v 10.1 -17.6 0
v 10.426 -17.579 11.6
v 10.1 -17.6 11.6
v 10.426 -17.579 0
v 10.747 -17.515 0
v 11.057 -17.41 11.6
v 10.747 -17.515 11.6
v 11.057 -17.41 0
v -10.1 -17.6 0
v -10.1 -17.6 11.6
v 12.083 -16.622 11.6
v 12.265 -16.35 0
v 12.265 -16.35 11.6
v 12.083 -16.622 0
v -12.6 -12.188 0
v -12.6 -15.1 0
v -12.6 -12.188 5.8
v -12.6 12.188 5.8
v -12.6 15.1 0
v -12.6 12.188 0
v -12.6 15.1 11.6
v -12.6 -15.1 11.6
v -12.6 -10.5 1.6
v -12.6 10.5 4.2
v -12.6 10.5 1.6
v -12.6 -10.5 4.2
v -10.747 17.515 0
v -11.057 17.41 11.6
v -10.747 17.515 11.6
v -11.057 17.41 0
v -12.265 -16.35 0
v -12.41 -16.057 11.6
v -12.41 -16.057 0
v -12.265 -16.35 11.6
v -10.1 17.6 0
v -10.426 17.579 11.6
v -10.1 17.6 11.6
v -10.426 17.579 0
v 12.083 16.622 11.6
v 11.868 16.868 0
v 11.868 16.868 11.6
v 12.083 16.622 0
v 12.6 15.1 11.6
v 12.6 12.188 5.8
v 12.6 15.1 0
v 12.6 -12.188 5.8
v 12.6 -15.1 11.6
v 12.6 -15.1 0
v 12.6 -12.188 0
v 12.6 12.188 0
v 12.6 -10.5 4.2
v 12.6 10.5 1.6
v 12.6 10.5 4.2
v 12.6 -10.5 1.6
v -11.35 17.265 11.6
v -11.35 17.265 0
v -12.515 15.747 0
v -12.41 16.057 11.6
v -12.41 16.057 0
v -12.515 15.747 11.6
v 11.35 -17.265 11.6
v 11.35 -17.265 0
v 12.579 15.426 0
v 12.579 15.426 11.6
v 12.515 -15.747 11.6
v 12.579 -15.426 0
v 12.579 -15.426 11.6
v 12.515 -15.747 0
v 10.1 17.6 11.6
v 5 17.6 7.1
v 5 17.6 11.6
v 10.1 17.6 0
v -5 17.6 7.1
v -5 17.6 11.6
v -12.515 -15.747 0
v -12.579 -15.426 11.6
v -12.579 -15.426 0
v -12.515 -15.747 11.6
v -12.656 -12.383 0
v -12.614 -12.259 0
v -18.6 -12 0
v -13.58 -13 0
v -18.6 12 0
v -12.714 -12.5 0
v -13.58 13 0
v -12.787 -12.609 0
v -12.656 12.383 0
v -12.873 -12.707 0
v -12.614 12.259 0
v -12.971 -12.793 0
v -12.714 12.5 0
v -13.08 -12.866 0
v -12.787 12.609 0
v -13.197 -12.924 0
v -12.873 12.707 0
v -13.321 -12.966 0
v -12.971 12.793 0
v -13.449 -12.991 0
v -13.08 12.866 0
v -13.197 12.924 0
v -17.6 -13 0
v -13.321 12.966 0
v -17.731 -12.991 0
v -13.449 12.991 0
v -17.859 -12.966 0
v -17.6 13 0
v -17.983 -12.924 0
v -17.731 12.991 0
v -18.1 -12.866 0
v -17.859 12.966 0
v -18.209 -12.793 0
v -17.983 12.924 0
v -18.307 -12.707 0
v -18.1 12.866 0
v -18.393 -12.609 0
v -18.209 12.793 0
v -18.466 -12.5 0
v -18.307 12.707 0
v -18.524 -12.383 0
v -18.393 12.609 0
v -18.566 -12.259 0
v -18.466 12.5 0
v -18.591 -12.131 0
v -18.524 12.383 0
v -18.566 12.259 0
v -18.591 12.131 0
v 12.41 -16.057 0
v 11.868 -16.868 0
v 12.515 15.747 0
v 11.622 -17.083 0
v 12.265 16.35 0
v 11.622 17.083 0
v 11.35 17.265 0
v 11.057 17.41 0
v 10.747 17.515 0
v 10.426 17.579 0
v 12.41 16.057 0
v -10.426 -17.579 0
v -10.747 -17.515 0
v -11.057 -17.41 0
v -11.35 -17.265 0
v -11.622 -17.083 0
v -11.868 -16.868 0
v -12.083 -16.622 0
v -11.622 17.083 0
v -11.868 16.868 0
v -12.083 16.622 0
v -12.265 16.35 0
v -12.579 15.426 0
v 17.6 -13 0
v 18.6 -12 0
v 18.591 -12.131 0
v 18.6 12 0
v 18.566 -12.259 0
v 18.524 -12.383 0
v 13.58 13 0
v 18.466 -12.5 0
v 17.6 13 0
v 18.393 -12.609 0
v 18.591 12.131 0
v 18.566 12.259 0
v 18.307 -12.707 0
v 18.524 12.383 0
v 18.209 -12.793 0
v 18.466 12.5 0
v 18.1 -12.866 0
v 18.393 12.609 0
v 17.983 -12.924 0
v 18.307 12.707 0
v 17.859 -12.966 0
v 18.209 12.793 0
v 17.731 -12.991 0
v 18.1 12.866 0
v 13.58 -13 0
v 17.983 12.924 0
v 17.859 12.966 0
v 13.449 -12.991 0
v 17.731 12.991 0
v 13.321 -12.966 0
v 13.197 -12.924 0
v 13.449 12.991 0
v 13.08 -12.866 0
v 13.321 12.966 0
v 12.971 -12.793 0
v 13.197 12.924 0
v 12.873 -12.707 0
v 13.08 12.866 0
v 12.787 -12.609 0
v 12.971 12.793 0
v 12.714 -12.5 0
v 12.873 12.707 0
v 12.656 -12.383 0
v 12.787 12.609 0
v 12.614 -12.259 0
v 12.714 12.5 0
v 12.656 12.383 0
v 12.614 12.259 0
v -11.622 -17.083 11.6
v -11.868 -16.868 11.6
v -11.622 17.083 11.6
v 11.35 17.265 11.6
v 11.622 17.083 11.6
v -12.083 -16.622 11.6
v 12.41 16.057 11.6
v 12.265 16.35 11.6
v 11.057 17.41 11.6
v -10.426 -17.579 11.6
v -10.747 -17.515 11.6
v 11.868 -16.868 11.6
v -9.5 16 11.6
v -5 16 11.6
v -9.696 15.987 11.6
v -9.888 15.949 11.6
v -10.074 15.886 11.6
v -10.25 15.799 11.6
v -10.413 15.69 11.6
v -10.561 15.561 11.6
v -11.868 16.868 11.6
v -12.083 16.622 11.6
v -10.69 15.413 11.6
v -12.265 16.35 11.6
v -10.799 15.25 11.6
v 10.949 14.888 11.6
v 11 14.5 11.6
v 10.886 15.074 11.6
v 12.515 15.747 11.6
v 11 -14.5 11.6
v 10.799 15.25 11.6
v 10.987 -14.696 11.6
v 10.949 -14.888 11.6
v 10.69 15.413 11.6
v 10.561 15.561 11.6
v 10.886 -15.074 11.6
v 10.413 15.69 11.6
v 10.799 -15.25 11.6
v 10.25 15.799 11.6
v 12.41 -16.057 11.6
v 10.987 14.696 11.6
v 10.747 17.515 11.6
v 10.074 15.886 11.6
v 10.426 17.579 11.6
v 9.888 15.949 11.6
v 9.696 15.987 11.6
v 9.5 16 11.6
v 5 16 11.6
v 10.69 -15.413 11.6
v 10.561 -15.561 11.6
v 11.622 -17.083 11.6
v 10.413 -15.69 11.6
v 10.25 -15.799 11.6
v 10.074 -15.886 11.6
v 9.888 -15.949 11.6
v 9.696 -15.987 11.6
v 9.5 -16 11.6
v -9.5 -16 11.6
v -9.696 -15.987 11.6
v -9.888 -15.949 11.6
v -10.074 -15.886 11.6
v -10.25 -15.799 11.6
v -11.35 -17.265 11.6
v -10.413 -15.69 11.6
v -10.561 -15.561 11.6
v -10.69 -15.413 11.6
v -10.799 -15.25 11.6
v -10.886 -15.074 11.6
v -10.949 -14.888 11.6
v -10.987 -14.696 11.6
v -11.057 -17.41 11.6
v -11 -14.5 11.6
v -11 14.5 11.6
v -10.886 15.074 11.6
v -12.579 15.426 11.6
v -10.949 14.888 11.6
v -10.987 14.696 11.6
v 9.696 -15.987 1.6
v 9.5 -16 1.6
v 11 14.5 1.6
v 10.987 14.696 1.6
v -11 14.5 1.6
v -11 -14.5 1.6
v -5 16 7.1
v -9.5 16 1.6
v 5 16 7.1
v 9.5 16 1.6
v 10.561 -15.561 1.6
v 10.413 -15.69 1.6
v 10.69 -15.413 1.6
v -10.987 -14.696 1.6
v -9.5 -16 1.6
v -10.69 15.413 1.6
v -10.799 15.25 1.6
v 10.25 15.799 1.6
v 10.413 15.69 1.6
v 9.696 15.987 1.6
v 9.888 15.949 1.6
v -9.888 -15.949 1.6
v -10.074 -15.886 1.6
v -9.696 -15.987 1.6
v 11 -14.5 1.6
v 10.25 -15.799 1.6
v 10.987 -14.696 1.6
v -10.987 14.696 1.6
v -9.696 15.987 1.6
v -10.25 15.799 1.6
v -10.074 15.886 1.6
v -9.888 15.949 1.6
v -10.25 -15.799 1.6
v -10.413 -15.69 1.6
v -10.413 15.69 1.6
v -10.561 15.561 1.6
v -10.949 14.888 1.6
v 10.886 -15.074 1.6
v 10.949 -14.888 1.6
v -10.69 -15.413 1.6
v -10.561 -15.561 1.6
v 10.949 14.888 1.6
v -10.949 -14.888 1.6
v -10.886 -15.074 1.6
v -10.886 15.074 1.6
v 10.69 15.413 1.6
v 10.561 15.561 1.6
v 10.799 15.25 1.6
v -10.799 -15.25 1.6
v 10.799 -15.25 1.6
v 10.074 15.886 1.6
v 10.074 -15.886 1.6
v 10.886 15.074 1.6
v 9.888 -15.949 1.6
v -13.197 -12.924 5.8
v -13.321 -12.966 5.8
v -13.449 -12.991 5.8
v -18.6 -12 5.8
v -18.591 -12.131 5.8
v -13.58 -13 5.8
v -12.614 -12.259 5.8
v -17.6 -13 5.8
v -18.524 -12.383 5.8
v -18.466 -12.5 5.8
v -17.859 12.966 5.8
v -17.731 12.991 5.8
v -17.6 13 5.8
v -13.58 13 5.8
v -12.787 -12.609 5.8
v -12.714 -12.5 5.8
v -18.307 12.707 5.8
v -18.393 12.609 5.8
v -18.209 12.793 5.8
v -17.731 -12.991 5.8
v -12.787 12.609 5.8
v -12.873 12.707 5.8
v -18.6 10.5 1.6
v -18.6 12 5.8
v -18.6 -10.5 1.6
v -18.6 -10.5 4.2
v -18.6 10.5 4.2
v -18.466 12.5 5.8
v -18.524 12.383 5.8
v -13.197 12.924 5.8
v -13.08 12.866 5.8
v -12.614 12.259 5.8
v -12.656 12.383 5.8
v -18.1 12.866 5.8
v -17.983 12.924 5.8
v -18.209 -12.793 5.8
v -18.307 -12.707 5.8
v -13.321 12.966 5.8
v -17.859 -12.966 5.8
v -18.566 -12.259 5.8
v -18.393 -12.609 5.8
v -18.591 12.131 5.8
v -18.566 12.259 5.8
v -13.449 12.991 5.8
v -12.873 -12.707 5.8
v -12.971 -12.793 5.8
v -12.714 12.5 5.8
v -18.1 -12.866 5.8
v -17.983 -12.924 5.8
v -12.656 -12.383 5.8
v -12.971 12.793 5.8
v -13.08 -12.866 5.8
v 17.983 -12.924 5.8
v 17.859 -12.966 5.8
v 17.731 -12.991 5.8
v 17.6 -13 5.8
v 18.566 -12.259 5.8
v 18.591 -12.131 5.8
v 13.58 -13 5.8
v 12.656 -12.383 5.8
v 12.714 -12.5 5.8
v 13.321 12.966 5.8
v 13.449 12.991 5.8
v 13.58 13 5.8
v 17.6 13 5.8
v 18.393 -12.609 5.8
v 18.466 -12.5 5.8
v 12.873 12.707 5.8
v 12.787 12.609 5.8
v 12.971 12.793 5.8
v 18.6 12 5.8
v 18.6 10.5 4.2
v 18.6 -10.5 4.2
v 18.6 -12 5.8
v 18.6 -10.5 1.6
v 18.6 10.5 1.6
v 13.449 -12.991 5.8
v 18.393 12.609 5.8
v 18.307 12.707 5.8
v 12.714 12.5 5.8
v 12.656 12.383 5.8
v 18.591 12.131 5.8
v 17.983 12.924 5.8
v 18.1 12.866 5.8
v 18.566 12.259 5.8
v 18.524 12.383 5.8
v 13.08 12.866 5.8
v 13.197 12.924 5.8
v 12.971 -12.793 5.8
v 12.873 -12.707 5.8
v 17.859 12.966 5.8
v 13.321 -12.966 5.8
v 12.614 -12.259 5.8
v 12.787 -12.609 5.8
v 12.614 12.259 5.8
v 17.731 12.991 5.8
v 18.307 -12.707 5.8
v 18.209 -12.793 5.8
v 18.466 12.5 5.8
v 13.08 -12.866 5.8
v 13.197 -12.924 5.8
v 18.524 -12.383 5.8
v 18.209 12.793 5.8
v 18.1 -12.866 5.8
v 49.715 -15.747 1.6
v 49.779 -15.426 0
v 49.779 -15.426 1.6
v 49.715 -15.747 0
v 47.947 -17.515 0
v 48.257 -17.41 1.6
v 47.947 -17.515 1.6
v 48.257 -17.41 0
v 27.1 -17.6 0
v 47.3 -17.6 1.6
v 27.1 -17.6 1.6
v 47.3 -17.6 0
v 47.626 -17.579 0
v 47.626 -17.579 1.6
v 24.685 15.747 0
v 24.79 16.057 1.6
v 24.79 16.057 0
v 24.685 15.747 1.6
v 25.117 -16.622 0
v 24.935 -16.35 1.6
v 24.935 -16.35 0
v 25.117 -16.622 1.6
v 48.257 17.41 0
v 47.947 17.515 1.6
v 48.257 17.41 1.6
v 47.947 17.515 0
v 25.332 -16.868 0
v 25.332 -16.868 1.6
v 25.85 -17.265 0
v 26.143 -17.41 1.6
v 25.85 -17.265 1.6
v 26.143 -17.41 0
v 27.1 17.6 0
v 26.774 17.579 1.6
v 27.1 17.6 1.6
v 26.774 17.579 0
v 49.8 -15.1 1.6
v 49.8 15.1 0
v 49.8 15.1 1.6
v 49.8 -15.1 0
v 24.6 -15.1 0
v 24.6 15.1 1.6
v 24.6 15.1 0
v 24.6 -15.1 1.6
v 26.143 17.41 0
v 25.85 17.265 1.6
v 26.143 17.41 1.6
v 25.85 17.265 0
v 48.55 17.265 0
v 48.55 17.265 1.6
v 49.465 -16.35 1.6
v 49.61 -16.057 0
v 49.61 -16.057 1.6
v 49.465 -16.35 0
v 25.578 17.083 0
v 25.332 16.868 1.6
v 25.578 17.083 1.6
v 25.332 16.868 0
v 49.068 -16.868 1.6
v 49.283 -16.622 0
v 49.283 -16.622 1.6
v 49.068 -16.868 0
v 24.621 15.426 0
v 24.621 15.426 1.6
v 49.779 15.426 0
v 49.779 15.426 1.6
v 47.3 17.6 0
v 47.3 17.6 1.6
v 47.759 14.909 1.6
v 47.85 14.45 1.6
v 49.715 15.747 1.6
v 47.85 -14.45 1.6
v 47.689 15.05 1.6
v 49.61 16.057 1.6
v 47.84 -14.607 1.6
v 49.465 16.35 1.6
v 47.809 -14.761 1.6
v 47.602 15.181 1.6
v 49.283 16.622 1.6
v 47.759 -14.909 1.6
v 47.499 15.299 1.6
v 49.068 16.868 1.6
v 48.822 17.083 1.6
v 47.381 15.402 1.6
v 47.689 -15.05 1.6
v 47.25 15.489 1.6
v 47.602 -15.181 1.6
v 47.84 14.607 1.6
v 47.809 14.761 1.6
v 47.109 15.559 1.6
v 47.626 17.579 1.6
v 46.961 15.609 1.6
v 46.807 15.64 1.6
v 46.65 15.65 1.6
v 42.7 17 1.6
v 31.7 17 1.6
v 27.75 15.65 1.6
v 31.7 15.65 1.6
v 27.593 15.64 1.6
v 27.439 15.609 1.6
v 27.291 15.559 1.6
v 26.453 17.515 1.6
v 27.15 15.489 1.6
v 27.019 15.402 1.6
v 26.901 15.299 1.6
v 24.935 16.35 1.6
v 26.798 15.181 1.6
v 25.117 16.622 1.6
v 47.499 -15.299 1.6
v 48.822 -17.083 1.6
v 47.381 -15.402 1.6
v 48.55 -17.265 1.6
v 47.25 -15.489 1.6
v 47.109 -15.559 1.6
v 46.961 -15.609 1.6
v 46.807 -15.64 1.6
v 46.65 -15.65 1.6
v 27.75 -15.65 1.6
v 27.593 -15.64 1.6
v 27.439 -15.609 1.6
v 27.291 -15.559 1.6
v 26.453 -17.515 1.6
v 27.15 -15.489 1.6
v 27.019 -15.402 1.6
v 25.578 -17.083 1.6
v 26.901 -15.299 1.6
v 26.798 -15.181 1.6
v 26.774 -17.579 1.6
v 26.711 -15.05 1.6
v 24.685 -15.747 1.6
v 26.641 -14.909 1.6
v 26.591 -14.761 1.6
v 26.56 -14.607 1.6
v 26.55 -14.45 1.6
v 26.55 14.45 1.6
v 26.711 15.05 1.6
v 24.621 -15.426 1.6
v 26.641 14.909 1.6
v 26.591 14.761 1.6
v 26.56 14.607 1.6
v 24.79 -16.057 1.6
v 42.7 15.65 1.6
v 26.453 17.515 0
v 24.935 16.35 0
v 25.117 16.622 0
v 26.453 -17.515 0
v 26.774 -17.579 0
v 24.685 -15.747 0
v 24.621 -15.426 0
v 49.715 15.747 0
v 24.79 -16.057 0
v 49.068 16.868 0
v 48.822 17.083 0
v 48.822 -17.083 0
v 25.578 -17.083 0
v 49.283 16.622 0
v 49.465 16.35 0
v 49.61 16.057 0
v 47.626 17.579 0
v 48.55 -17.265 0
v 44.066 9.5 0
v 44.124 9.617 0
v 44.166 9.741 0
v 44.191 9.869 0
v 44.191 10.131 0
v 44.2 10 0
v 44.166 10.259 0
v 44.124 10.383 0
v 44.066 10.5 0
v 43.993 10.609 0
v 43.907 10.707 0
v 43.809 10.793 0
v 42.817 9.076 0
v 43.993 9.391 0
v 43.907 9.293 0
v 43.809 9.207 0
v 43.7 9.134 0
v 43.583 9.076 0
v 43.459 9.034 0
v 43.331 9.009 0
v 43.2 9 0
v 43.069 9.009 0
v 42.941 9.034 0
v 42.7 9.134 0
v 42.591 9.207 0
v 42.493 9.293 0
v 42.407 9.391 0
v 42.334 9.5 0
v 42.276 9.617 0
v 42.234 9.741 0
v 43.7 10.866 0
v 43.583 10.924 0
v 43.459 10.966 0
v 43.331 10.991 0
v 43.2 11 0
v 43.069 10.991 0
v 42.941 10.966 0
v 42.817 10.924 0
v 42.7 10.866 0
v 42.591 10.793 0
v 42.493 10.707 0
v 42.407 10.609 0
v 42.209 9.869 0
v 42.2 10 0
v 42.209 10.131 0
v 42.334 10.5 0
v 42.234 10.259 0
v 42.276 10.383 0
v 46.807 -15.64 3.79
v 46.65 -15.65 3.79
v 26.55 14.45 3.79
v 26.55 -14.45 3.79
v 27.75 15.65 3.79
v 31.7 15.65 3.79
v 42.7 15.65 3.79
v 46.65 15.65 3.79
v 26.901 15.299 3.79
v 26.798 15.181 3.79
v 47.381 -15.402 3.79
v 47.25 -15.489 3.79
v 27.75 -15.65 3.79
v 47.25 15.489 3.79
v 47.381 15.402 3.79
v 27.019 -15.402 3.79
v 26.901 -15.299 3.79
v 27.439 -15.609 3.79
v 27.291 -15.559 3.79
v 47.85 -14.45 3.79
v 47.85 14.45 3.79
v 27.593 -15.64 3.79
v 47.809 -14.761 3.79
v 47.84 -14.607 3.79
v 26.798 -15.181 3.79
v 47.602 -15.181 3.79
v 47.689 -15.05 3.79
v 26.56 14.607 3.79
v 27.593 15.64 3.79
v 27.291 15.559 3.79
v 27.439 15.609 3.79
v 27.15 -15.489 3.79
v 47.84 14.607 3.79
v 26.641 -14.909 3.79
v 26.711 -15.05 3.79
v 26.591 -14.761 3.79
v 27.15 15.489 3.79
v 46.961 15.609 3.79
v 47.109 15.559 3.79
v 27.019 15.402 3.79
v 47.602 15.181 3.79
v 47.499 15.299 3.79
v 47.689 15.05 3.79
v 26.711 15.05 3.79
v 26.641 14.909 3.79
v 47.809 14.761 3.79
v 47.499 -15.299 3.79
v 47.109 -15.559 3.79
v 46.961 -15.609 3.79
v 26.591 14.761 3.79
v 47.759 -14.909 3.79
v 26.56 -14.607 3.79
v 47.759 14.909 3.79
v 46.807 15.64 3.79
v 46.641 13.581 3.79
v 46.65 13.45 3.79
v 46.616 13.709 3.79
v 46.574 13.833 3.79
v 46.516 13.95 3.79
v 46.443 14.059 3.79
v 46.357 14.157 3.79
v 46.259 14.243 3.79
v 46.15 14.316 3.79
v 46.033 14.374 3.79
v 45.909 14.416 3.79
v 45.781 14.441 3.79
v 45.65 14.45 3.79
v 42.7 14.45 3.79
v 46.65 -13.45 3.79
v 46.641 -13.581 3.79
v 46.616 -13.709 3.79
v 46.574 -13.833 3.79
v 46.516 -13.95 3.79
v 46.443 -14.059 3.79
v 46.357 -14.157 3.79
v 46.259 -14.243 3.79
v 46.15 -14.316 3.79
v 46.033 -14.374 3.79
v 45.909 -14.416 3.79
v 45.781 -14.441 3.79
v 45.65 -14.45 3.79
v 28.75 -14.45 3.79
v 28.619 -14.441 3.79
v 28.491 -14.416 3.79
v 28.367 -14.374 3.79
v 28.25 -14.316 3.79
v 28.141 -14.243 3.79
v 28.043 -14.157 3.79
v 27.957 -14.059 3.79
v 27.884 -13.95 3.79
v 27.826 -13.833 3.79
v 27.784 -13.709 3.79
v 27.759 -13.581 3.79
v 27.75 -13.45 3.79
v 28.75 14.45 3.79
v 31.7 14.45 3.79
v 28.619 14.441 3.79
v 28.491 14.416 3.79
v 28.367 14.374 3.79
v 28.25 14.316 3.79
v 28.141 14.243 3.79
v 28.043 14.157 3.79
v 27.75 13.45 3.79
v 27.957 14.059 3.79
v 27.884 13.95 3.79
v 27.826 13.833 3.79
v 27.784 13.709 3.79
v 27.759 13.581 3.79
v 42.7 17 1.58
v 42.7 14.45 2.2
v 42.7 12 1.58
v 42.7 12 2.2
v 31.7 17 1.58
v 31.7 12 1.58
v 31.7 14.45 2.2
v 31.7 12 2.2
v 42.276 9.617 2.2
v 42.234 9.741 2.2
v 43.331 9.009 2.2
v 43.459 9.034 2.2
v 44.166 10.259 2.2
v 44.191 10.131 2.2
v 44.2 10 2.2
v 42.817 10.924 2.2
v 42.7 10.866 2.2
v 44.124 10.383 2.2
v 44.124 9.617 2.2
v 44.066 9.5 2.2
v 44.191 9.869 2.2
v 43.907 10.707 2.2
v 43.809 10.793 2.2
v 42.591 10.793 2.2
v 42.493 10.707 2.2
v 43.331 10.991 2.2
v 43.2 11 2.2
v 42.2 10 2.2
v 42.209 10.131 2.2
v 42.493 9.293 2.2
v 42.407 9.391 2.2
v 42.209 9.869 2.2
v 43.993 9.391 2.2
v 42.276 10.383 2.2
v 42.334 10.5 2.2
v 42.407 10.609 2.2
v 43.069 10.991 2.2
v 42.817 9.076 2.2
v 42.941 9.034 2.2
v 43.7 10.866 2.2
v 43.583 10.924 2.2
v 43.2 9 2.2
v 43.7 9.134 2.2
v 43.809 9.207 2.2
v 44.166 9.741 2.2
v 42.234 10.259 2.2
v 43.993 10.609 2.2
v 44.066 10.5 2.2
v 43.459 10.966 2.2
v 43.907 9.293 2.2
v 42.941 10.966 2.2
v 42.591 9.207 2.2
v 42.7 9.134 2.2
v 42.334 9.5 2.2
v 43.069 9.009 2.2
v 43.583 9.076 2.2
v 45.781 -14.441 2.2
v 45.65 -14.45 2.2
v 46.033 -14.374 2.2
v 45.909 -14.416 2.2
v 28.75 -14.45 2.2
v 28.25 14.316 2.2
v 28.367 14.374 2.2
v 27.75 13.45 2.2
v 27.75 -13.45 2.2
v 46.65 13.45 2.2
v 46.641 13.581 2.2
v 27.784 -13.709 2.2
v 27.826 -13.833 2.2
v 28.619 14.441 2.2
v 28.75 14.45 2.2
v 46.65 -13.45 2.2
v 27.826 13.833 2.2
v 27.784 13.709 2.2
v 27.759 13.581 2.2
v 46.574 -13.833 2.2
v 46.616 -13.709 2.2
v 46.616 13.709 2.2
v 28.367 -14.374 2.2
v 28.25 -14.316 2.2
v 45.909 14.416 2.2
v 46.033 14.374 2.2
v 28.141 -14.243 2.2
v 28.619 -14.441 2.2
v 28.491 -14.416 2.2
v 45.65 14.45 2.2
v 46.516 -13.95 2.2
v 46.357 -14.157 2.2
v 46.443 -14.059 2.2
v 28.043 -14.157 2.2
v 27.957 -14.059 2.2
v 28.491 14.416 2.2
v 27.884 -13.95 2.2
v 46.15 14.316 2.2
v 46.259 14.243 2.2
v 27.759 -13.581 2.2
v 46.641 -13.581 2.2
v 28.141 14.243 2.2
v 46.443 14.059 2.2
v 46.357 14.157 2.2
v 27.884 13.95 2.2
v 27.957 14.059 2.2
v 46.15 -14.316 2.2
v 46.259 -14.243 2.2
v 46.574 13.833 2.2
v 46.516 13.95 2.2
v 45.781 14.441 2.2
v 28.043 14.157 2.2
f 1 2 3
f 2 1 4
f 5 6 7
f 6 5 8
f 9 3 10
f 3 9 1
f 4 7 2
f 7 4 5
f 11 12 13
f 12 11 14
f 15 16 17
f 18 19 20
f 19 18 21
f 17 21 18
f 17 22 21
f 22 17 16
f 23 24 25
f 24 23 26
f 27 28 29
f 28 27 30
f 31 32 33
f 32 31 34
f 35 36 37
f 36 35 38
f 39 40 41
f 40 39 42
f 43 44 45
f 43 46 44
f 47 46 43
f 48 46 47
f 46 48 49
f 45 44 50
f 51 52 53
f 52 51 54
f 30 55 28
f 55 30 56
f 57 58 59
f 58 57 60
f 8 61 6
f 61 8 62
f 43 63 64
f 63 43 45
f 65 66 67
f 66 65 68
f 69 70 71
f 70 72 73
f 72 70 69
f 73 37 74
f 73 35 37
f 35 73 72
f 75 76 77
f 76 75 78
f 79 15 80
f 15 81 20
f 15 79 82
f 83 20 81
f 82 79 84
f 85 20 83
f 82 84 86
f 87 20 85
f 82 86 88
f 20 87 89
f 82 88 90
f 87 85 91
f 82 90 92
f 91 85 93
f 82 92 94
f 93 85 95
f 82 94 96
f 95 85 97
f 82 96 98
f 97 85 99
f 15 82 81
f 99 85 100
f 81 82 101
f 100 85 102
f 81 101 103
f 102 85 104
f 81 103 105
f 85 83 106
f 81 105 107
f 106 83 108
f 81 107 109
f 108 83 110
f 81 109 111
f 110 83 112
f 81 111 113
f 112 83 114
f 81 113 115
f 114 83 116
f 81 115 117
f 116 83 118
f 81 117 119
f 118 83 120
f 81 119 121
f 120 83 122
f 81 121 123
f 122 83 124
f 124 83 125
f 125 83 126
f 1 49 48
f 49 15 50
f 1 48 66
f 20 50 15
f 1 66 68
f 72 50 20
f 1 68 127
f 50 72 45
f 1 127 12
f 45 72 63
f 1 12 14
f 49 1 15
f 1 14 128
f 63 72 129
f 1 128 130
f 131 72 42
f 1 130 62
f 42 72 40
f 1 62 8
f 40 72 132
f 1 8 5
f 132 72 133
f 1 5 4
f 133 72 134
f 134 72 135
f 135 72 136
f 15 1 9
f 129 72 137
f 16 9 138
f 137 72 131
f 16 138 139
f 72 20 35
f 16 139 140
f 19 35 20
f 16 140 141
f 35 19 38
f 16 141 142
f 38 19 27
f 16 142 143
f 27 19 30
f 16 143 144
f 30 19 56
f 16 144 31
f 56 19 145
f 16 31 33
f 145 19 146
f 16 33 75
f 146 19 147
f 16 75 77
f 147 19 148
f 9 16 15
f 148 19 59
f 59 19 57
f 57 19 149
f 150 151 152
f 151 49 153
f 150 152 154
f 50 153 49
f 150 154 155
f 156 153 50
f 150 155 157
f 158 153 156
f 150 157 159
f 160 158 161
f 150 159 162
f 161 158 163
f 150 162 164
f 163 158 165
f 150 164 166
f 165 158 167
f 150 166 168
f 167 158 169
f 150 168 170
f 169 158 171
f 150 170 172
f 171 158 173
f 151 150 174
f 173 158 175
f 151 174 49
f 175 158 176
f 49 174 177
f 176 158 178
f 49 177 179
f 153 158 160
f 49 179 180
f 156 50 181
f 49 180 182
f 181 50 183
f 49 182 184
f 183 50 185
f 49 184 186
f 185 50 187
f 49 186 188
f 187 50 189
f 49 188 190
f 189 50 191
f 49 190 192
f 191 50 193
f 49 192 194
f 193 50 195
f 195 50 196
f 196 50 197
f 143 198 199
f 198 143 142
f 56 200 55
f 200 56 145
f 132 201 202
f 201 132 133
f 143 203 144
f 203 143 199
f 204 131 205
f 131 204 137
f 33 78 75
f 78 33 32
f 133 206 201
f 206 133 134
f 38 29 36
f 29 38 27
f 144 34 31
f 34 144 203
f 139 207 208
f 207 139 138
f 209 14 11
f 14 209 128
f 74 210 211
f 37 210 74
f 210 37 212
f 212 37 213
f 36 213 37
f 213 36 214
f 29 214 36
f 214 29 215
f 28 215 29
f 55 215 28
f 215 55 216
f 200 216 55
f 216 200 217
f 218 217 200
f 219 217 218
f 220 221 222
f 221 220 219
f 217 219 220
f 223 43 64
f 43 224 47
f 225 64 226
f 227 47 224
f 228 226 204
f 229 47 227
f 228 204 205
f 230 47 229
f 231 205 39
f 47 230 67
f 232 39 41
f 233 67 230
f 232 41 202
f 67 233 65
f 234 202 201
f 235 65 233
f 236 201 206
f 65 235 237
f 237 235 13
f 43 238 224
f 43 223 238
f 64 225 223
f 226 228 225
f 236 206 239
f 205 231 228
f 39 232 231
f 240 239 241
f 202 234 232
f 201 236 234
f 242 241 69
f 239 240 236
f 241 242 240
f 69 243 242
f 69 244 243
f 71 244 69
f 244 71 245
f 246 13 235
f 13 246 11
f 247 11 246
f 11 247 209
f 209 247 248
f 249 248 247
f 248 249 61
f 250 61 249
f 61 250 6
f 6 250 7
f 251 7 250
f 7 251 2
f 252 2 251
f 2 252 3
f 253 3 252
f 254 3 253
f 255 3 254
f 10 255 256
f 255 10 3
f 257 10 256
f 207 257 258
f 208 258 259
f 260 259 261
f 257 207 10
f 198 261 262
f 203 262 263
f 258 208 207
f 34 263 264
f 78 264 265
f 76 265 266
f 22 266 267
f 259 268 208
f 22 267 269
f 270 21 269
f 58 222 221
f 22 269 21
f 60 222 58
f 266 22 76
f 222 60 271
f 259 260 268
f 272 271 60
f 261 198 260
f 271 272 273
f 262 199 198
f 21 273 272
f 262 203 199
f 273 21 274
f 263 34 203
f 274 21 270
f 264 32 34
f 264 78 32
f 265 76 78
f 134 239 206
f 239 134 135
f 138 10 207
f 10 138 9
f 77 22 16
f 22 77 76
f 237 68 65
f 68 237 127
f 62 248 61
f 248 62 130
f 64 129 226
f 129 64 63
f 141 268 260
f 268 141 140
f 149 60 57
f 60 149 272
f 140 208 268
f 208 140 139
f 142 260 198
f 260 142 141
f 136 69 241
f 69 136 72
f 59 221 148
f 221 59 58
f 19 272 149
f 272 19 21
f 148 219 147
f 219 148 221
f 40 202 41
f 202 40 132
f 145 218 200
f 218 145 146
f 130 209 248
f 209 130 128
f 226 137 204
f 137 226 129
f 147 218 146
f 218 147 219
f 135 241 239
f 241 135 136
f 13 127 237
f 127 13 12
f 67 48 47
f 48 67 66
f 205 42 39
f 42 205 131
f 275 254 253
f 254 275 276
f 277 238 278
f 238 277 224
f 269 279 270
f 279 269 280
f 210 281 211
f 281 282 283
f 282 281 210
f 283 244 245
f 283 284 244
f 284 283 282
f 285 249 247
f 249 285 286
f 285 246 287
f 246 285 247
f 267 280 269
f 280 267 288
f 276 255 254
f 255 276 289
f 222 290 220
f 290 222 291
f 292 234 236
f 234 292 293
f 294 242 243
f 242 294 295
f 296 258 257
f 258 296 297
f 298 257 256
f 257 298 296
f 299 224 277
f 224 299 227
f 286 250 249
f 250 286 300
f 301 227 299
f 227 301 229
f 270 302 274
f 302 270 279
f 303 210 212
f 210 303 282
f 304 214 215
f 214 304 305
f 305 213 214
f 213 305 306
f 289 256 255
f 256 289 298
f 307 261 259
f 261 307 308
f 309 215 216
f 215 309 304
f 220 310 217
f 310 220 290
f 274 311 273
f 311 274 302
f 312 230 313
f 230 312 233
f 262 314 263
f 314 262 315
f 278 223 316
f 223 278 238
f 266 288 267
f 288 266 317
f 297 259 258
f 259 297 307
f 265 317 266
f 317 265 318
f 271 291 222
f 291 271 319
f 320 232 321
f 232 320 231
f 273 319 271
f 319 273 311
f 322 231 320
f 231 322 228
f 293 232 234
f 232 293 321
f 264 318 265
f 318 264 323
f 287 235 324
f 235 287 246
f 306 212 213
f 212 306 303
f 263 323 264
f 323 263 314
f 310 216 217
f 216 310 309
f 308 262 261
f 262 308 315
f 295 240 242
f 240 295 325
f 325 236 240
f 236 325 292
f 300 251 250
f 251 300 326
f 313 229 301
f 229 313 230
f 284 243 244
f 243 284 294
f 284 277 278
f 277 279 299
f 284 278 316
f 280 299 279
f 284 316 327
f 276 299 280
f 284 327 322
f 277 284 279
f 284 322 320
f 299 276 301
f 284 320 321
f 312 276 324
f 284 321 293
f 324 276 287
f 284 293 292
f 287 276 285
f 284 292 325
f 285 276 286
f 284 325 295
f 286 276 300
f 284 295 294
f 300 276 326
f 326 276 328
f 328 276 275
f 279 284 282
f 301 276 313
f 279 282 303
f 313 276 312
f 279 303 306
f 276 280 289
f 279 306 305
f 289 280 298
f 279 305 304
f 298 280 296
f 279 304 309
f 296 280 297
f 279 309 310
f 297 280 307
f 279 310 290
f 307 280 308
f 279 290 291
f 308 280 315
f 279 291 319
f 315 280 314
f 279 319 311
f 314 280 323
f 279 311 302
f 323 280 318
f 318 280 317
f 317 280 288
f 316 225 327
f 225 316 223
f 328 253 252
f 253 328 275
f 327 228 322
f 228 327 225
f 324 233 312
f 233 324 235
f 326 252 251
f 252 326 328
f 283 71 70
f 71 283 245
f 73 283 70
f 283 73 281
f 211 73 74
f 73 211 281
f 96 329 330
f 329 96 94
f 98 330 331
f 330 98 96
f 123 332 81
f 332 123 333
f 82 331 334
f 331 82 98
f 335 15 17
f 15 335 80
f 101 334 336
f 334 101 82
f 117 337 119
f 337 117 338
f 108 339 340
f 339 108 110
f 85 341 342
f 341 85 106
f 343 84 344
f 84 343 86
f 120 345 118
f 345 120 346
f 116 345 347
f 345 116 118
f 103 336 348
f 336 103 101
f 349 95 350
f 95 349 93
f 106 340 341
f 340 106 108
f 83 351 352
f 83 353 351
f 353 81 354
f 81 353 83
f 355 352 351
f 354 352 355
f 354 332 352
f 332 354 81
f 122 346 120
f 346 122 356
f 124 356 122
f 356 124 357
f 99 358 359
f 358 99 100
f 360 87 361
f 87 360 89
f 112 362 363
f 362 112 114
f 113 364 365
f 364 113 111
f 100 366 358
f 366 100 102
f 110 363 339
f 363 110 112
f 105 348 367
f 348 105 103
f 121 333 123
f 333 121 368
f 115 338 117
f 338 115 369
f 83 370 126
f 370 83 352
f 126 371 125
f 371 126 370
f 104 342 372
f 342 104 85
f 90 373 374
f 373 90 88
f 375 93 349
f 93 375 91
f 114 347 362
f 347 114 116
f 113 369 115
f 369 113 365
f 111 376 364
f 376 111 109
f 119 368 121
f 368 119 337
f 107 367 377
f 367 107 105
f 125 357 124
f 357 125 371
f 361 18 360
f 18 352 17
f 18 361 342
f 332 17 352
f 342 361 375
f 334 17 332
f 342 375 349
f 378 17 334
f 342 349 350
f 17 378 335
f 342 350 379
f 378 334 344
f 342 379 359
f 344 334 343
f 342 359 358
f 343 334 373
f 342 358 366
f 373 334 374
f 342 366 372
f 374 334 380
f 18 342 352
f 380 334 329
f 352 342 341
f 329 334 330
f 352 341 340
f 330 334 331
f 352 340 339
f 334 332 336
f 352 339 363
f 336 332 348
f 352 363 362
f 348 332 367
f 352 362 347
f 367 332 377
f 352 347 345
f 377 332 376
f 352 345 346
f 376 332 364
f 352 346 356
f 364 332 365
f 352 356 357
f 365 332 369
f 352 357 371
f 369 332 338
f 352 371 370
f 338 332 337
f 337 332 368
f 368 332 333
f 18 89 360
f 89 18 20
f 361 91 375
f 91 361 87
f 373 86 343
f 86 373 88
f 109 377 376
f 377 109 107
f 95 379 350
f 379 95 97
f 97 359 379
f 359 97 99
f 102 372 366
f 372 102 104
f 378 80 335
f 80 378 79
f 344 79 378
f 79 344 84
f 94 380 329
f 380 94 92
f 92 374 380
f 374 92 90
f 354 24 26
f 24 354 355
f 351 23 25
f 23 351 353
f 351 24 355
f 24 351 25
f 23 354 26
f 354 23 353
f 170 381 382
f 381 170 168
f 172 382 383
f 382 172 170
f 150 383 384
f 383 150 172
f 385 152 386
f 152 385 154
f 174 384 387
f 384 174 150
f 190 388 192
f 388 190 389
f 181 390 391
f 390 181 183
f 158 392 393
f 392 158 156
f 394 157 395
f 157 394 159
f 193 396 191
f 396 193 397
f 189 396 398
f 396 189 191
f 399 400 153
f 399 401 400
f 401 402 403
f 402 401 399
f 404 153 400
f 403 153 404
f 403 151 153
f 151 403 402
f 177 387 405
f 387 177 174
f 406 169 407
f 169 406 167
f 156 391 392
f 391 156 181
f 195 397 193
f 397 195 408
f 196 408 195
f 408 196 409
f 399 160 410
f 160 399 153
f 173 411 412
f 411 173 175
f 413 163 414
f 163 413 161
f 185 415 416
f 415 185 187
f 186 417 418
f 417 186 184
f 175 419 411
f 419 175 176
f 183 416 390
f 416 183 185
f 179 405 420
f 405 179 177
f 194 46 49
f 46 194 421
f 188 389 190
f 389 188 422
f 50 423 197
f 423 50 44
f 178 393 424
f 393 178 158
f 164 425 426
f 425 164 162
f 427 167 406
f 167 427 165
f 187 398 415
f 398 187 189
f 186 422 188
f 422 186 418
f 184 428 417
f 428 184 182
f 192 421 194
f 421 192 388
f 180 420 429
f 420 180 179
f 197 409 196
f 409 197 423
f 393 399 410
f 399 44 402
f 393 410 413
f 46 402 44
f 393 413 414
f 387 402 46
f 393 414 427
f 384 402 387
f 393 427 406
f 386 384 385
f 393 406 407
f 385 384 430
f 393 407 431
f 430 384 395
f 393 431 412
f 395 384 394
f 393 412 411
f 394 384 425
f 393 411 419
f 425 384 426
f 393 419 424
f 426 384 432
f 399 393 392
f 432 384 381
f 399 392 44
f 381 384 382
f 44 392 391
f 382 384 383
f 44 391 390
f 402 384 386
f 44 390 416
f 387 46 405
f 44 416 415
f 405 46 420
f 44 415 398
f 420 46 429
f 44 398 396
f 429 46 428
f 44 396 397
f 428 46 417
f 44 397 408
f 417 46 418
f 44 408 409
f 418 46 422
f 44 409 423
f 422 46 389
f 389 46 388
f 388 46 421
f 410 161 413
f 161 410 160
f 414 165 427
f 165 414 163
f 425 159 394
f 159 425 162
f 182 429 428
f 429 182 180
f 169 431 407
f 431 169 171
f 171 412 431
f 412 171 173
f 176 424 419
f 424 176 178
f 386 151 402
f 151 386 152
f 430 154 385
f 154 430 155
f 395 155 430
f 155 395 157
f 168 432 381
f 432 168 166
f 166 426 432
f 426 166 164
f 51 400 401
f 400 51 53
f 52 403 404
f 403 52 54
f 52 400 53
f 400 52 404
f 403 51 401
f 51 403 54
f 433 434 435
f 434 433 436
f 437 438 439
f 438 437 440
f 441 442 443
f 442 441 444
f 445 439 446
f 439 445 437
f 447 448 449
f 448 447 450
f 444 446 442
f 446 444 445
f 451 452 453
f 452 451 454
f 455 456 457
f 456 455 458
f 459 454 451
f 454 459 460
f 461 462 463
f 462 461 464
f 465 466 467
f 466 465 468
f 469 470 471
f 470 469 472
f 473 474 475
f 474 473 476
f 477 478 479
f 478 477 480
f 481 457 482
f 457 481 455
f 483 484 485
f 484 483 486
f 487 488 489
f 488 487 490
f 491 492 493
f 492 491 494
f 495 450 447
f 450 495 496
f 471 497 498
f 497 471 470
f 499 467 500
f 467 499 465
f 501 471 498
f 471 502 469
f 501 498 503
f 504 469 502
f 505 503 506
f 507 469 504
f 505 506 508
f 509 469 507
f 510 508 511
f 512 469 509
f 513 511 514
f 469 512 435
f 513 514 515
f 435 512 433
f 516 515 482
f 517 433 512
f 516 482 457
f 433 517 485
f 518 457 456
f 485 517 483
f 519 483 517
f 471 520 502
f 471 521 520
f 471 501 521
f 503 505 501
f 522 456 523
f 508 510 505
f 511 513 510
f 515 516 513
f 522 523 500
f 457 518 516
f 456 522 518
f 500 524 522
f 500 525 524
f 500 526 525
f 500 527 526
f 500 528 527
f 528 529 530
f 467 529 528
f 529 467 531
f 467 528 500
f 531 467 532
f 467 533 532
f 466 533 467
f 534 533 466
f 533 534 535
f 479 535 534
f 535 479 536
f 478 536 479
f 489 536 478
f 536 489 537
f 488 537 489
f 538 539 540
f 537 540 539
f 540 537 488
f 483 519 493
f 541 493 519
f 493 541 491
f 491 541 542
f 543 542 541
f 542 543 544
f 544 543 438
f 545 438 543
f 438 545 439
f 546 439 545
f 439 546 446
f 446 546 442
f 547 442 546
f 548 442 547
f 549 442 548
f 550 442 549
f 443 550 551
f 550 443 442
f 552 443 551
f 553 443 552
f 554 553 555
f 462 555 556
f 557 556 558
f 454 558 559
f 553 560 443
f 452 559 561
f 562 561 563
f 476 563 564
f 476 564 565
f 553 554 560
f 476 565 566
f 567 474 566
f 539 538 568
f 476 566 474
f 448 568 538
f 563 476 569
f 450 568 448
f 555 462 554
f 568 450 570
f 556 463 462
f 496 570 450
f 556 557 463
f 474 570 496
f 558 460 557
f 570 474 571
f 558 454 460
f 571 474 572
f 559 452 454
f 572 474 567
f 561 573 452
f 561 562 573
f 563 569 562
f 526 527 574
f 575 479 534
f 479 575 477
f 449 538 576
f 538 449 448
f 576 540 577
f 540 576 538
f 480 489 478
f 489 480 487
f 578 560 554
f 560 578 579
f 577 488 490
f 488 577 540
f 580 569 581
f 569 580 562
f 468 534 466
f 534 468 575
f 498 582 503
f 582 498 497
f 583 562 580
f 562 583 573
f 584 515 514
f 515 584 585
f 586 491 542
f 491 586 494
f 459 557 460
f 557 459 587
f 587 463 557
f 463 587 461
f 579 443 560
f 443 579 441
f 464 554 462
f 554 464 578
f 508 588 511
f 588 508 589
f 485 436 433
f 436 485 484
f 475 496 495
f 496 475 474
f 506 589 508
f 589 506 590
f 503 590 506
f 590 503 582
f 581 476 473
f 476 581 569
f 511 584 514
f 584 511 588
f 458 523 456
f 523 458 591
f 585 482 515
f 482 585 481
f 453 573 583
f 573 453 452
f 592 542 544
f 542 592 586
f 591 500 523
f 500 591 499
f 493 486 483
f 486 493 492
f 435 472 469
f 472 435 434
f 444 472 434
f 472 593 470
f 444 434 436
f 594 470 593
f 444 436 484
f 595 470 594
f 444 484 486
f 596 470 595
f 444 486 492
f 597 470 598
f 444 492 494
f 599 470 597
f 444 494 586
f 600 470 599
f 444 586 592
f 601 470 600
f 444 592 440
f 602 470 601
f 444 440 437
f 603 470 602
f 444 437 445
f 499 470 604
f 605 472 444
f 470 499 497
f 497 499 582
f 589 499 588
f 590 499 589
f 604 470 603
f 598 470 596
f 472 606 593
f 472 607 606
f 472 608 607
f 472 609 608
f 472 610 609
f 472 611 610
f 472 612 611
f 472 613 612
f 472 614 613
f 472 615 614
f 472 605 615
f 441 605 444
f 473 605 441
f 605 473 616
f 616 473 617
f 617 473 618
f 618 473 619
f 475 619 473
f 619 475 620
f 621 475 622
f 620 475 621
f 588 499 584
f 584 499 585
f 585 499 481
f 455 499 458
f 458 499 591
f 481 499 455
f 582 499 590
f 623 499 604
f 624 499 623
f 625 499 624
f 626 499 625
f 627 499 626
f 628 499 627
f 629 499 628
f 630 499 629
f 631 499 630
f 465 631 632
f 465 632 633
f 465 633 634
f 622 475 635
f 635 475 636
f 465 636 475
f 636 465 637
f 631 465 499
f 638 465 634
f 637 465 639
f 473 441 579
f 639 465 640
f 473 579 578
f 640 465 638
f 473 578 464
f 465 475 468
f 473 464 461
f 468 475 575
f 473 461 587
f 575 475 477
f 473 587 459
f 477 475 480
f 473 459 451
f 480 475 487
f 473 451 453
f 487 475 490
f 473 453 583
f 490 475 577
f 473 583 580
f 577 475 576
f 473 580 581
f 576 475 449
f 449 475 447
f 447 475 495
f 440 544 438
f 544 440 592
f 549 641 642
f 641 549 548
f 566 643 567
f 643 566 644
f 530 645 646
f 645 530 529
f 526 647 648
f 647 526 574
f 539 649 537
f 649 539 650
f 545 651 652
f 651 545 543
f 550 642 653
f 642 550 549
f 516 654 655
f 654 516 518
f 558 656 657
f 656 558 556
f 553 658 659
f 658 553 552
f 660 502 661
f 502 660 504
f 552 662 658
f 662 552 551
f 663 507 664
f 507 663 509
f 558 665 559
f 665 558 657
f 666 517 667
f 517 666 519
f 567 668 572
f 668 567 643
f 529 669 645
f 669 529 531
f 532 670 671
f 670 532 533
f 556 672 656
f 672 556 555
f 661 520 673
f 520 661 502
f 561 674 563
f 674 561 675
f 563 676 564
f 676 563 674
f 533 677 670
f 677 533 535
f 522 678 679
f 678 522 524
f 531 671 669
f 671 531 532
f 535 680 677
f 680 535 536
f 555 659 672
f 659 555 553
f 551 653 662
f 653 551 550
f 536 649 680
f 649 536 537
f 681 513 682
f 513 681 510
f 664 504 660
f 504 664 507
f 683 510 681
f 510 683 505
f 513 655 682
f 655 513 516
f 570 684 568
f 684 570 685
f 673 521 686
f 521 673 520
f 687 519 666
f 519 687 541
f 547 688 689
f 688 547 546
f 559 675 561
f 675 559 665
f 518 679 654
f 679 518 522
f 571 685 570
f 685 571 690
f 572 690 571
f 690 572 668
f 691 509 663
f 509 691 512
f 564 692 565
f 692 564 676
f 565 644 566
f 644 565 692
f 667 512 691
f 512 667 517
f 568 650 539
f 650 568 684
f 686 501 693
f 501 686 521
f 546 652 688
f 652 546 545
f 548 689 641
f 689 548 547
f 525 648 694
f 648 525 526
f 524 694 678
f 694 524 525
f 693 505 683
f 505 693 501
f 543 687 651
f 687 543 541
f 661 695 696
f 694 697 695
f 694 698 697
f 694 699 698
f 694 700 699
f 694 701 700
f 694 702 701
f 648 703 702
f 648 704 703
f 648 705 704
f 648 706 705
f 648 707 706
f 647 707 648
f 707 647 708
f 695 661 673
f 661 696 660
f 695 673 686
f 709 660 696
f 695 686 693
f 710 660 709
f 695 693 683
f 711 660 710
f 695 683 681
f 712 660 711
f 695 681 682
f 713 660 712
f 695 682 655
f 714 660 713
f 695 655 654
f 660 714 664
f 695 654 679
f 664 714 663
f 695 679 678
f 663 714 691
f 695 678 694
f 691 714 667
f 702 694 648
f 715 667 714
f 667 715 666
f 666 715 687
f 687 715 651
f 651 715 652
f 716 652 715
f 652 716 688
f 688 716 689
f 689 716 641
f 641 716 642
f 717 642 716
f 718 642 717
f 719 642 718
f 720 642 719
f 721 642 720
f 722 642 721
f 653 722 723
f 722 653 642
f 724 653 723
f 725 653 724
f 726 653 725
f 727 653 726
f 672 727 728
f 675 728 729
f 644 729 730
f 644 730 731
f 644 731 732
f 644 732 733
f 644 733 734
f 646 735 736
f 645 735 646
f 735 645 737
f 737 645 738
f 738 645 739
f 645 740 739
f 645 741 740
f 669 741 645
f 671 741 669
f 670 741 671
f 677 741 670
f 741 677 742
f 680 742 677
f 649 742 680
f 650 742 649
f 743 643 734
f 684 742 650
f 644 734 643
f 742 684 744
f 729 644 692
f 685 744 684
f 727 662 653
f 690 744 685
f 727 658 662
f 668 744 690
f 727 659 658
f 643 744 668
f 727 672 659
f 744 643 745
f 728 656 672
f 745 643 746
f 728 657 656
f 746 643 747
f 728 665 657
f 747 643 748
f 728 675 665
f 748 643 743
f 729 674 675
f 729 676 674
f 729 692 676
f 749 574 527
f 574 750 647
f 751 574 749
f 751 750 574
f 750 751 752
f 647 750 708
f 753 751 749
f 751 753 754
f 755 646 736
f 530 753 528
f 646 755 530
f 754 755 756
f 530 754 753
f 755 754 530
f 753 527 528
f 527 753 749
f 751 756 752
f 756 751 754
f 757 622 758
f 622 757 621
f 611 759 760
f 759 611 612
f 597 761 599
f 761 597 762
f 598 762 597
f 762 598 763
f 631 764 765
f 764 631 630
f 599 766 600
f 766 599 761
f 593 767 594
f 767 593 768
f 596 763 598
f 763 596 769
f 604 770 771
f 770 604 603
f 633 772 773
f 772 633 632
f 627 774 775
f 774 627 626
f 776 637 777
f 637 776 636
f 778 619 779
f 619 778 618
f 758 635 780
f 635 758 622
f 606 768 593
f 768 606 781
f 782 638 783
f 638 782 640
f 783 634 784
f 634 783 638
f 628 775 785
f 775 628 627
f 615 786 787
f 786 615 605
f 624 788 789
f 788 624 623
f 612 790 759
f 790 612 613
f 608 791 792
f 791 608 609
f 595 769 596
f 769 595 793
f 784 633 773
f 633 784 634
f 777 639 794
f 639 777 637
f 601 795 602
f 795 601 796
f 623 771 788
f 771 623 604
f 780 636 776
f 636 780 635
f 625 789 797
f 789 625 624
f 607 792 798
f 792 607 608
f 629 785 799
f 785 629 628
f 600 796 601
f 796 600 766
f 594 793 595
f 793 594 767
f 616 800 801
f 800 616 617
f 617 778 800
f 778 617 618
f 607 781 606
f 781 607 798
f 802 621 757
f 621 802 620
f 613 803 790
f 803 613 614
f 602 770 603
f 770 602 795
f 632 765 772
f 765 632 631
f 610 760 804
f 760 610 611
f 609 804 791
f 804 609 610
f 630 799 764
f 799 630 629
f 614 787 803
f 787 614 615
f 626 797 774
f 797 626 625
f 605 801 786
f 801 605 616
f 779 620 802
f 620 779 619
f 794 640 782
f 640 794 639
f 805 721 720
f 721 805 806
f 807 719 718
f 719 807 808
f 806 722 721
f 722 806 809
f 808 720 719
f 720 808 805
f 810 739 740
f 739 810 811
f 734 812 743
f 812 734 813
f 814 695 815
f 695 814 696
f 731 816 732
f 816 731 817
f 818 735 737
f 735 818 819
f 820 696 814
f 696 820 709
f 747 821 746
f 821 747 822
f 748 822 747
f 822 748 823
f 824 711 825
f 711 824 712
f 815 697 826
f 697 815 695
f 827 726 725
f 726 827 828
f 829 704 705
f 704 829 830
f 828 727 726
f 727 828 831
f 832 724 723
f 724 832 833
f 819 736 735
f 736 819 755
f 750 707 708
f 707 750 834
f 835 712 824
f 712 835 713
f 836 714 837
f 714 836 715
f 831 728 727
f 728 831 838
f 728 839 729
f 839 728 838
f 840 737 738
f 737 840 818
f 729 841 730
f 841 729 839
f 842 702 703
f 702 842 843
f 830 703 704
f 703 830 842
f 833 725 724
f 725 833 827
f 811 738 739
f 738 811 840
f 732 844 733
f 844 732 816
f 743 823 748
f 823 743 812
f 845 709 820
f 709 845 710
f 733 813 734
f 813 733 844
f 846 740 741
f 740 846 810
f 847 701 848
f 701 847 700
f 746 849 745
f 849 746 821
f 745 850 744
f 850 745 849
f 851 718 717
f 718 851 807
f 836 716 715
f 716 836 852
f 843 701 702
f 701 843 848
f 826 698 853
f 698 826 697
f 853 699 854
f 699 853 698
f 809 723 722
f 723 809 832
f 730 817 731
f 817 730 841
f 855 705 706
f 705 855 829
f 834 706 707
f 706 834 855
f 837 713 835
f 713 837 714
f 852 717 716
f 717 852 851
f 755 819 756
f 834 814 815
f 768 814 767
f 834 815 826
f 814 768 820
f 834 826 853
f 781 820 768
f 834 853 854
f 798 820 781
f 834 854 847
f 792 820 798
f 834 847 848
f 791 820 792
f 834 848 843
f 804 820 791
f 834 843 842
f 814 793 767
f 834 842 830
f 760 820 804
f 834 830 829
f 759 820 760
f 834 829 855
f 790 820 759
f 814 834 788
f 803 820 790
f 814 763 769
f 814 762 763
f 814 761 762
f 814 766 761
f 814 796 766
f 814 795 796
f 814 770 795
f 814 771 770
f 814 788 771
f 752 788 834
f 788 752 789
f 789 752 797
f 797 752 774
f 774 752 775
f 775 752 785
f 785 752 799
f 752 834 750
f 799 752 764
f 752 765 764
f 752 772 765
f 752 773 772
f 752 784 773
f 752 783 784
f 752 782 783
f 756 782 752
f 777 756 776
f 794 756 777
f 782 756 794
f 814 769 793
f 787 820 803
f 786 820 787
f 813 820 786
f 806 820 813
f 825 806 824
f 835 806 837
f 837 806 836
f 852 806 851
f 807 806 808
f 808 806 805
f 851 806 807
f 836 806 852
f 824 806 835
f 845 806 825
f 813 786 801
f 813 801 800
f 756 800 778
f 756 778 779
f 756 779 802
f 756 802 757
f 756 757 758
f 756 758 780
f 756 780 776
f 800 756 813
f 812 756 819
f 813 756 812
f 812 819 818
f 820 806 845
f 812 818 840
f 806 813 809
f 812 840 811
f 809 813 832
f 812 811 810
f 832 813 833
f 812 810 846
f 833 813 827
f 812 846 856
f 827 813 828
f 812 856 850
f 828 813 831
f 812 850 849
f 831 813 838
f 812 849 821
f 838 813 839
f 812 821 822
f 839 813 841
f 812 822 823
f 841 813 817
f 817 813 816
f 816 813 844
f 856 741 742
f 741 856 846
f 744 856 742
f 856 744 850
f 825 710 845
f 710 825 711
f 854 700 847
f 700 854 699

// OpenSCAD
// ============================================================
//  Tempo Sensor — корпус для XIAO nRF52840 Sense + LiPo 402030
//  OpenSCAD. Выберите mount и part, F6 → Export STL.
// ============================================================

mount = "glove";   // "glove" — две петли под ремешок-липучку 20 мм (на перчатку)
                   // "shaft" — ложе под шафт + 2 стяжки (под грипом)
part  = "both";    // "both" | "base" | "lid"

// ---------- Внутренний объём (плата 21×18×~4 поверх батареи 4×20×30) ----------
in_x = 22;     // ширина
in_y = 32;     // длина
in_z = 10;     // высота стопки: батарея 4.5 + плата с деталями 4 + запас
wall = 1.6;
floor_t = 1.6;
r = 2.5;       // скругление углов

// ---------- Окно USB-C (плата лежит сверху, разъём на коротком торце +Y) ----------
usb_w = 10;
usb_z0 = 5.5;  // низ окна над полом (батарея под платой)

// ---------- Крышка ----------
lid_t = 1.6;
lip_h = 2.2;
tol = 0.35;    // зазор посадки бортика

// ---------- Крепление "glove" ----------
strap_w = 21;  // ширина ремешка (20 мм + запас)
strap_t = 2.6; // толщина ремешка
ear_w = 6;     // вылет петли от стенки

// ---------- Крепление "shaft" ----------
shaft_d = 15;  // диаметр шафта под грипом (обычно 14–16 мм)
tie_w = 4.5;   // ширина стяжки
tie_t = 2;     // толщина стяжки

// ============================================================
$fn = 48;
ox = in_x + 2*wall;
oy = in_y + 2*wall;
oz = floor_t + in_z;

module rbox(x, y, z, rr) {
    linear_extrude(z) offset(rr) offset(-rr) square([x, y], center = true);
}

module cavity() {
    translate([0, 0, floor_t]) rbox(in_x, in_y, in_z + 1, 1.5);
}

module usb_window() {
    // сквозь стенку +Y, от usb_z0 до верха (крышка закрывает остаток)
    translate([-usb_w/2, in_y/2 - 1, floor_t + usb_z0])
        cube([usb_w, wall + 2, in_z]);
}

module led_hole() {
    // отверстие 2 мм в крышке над индикатором (угол платы у USB)
    translate([6, in_y/2 - 6, -1]) cylinder(d = 2, h = lid_t + 2);
}

module glove_ears() {
    for (s = [-1, 1])
        translate([s * (ox/2 + ear_w/2 - 0.01), 0, 0])
        difference() {
            rbox(ear_w + 0.02, strap_w + 5, strap_t + 2*1.6, 1);
            translate([-ear_w, -strap_w/2, 1.6]) cube([2*ear_w, strap_w, strap_t]);
        }
}

module shaft_cradle() {
    cradle_h = shaft_d/2 + 1 + tie_t + 2;
    translate([0, 0, -cradle_h])
    difference() {
        rbox(ox, oy, cradle_h + 0.01, r);
        // ложе под шафт вдоль Y
        translate([0, 0, 0]) rotate([90, 0, 0]) cylinder(d = shaft_d, h = oy + 2, center = true);
        // два паза под стяжки
        for (y = [-10, 10])
            translate([-ox/2 - 1, y - tie_w/2, shaft_d/2 + 1]) cube([ox + 2, tie_w, tie_t]);
    }
}

module base() {
    difference() {
        rbox(ox, oy, oz, r);
        cavity();
        usb_window();
    }
    if (mount == "glove") glove_ears();
    if (mount == "shaft") shaft_cradle();
}

module lid() {
    difference() {
        union() {
            rbox(ox, oy, lid_t, r);
            translate([0, 0, lid_t - 0.01])
                rbox(in_x - 2*tol, in_y - 2*tol, lip_h, 1.2);
        }
        // вырез в бортике над USB-окном
        translate([-usb_w/2 - 0.5, in_y/2 - 4, lid_t - 0.02]) cube([usb_w + 1, 5, lip_h + 1]);
        led_hole();
        // внутренняя выборка бортика, чтобы не давить на детали платы
        translate([0, 0, lid_t + 0.6]) rbox(in_x - 2*tol - 2.4, in_y - 2*tol - 2.4, lip_h, 1);
    }
}

if (part == "base" || part == "both") base();
if (part == "lid"  || part == "both") translate([ox + 12, 0, 0]) lid();
